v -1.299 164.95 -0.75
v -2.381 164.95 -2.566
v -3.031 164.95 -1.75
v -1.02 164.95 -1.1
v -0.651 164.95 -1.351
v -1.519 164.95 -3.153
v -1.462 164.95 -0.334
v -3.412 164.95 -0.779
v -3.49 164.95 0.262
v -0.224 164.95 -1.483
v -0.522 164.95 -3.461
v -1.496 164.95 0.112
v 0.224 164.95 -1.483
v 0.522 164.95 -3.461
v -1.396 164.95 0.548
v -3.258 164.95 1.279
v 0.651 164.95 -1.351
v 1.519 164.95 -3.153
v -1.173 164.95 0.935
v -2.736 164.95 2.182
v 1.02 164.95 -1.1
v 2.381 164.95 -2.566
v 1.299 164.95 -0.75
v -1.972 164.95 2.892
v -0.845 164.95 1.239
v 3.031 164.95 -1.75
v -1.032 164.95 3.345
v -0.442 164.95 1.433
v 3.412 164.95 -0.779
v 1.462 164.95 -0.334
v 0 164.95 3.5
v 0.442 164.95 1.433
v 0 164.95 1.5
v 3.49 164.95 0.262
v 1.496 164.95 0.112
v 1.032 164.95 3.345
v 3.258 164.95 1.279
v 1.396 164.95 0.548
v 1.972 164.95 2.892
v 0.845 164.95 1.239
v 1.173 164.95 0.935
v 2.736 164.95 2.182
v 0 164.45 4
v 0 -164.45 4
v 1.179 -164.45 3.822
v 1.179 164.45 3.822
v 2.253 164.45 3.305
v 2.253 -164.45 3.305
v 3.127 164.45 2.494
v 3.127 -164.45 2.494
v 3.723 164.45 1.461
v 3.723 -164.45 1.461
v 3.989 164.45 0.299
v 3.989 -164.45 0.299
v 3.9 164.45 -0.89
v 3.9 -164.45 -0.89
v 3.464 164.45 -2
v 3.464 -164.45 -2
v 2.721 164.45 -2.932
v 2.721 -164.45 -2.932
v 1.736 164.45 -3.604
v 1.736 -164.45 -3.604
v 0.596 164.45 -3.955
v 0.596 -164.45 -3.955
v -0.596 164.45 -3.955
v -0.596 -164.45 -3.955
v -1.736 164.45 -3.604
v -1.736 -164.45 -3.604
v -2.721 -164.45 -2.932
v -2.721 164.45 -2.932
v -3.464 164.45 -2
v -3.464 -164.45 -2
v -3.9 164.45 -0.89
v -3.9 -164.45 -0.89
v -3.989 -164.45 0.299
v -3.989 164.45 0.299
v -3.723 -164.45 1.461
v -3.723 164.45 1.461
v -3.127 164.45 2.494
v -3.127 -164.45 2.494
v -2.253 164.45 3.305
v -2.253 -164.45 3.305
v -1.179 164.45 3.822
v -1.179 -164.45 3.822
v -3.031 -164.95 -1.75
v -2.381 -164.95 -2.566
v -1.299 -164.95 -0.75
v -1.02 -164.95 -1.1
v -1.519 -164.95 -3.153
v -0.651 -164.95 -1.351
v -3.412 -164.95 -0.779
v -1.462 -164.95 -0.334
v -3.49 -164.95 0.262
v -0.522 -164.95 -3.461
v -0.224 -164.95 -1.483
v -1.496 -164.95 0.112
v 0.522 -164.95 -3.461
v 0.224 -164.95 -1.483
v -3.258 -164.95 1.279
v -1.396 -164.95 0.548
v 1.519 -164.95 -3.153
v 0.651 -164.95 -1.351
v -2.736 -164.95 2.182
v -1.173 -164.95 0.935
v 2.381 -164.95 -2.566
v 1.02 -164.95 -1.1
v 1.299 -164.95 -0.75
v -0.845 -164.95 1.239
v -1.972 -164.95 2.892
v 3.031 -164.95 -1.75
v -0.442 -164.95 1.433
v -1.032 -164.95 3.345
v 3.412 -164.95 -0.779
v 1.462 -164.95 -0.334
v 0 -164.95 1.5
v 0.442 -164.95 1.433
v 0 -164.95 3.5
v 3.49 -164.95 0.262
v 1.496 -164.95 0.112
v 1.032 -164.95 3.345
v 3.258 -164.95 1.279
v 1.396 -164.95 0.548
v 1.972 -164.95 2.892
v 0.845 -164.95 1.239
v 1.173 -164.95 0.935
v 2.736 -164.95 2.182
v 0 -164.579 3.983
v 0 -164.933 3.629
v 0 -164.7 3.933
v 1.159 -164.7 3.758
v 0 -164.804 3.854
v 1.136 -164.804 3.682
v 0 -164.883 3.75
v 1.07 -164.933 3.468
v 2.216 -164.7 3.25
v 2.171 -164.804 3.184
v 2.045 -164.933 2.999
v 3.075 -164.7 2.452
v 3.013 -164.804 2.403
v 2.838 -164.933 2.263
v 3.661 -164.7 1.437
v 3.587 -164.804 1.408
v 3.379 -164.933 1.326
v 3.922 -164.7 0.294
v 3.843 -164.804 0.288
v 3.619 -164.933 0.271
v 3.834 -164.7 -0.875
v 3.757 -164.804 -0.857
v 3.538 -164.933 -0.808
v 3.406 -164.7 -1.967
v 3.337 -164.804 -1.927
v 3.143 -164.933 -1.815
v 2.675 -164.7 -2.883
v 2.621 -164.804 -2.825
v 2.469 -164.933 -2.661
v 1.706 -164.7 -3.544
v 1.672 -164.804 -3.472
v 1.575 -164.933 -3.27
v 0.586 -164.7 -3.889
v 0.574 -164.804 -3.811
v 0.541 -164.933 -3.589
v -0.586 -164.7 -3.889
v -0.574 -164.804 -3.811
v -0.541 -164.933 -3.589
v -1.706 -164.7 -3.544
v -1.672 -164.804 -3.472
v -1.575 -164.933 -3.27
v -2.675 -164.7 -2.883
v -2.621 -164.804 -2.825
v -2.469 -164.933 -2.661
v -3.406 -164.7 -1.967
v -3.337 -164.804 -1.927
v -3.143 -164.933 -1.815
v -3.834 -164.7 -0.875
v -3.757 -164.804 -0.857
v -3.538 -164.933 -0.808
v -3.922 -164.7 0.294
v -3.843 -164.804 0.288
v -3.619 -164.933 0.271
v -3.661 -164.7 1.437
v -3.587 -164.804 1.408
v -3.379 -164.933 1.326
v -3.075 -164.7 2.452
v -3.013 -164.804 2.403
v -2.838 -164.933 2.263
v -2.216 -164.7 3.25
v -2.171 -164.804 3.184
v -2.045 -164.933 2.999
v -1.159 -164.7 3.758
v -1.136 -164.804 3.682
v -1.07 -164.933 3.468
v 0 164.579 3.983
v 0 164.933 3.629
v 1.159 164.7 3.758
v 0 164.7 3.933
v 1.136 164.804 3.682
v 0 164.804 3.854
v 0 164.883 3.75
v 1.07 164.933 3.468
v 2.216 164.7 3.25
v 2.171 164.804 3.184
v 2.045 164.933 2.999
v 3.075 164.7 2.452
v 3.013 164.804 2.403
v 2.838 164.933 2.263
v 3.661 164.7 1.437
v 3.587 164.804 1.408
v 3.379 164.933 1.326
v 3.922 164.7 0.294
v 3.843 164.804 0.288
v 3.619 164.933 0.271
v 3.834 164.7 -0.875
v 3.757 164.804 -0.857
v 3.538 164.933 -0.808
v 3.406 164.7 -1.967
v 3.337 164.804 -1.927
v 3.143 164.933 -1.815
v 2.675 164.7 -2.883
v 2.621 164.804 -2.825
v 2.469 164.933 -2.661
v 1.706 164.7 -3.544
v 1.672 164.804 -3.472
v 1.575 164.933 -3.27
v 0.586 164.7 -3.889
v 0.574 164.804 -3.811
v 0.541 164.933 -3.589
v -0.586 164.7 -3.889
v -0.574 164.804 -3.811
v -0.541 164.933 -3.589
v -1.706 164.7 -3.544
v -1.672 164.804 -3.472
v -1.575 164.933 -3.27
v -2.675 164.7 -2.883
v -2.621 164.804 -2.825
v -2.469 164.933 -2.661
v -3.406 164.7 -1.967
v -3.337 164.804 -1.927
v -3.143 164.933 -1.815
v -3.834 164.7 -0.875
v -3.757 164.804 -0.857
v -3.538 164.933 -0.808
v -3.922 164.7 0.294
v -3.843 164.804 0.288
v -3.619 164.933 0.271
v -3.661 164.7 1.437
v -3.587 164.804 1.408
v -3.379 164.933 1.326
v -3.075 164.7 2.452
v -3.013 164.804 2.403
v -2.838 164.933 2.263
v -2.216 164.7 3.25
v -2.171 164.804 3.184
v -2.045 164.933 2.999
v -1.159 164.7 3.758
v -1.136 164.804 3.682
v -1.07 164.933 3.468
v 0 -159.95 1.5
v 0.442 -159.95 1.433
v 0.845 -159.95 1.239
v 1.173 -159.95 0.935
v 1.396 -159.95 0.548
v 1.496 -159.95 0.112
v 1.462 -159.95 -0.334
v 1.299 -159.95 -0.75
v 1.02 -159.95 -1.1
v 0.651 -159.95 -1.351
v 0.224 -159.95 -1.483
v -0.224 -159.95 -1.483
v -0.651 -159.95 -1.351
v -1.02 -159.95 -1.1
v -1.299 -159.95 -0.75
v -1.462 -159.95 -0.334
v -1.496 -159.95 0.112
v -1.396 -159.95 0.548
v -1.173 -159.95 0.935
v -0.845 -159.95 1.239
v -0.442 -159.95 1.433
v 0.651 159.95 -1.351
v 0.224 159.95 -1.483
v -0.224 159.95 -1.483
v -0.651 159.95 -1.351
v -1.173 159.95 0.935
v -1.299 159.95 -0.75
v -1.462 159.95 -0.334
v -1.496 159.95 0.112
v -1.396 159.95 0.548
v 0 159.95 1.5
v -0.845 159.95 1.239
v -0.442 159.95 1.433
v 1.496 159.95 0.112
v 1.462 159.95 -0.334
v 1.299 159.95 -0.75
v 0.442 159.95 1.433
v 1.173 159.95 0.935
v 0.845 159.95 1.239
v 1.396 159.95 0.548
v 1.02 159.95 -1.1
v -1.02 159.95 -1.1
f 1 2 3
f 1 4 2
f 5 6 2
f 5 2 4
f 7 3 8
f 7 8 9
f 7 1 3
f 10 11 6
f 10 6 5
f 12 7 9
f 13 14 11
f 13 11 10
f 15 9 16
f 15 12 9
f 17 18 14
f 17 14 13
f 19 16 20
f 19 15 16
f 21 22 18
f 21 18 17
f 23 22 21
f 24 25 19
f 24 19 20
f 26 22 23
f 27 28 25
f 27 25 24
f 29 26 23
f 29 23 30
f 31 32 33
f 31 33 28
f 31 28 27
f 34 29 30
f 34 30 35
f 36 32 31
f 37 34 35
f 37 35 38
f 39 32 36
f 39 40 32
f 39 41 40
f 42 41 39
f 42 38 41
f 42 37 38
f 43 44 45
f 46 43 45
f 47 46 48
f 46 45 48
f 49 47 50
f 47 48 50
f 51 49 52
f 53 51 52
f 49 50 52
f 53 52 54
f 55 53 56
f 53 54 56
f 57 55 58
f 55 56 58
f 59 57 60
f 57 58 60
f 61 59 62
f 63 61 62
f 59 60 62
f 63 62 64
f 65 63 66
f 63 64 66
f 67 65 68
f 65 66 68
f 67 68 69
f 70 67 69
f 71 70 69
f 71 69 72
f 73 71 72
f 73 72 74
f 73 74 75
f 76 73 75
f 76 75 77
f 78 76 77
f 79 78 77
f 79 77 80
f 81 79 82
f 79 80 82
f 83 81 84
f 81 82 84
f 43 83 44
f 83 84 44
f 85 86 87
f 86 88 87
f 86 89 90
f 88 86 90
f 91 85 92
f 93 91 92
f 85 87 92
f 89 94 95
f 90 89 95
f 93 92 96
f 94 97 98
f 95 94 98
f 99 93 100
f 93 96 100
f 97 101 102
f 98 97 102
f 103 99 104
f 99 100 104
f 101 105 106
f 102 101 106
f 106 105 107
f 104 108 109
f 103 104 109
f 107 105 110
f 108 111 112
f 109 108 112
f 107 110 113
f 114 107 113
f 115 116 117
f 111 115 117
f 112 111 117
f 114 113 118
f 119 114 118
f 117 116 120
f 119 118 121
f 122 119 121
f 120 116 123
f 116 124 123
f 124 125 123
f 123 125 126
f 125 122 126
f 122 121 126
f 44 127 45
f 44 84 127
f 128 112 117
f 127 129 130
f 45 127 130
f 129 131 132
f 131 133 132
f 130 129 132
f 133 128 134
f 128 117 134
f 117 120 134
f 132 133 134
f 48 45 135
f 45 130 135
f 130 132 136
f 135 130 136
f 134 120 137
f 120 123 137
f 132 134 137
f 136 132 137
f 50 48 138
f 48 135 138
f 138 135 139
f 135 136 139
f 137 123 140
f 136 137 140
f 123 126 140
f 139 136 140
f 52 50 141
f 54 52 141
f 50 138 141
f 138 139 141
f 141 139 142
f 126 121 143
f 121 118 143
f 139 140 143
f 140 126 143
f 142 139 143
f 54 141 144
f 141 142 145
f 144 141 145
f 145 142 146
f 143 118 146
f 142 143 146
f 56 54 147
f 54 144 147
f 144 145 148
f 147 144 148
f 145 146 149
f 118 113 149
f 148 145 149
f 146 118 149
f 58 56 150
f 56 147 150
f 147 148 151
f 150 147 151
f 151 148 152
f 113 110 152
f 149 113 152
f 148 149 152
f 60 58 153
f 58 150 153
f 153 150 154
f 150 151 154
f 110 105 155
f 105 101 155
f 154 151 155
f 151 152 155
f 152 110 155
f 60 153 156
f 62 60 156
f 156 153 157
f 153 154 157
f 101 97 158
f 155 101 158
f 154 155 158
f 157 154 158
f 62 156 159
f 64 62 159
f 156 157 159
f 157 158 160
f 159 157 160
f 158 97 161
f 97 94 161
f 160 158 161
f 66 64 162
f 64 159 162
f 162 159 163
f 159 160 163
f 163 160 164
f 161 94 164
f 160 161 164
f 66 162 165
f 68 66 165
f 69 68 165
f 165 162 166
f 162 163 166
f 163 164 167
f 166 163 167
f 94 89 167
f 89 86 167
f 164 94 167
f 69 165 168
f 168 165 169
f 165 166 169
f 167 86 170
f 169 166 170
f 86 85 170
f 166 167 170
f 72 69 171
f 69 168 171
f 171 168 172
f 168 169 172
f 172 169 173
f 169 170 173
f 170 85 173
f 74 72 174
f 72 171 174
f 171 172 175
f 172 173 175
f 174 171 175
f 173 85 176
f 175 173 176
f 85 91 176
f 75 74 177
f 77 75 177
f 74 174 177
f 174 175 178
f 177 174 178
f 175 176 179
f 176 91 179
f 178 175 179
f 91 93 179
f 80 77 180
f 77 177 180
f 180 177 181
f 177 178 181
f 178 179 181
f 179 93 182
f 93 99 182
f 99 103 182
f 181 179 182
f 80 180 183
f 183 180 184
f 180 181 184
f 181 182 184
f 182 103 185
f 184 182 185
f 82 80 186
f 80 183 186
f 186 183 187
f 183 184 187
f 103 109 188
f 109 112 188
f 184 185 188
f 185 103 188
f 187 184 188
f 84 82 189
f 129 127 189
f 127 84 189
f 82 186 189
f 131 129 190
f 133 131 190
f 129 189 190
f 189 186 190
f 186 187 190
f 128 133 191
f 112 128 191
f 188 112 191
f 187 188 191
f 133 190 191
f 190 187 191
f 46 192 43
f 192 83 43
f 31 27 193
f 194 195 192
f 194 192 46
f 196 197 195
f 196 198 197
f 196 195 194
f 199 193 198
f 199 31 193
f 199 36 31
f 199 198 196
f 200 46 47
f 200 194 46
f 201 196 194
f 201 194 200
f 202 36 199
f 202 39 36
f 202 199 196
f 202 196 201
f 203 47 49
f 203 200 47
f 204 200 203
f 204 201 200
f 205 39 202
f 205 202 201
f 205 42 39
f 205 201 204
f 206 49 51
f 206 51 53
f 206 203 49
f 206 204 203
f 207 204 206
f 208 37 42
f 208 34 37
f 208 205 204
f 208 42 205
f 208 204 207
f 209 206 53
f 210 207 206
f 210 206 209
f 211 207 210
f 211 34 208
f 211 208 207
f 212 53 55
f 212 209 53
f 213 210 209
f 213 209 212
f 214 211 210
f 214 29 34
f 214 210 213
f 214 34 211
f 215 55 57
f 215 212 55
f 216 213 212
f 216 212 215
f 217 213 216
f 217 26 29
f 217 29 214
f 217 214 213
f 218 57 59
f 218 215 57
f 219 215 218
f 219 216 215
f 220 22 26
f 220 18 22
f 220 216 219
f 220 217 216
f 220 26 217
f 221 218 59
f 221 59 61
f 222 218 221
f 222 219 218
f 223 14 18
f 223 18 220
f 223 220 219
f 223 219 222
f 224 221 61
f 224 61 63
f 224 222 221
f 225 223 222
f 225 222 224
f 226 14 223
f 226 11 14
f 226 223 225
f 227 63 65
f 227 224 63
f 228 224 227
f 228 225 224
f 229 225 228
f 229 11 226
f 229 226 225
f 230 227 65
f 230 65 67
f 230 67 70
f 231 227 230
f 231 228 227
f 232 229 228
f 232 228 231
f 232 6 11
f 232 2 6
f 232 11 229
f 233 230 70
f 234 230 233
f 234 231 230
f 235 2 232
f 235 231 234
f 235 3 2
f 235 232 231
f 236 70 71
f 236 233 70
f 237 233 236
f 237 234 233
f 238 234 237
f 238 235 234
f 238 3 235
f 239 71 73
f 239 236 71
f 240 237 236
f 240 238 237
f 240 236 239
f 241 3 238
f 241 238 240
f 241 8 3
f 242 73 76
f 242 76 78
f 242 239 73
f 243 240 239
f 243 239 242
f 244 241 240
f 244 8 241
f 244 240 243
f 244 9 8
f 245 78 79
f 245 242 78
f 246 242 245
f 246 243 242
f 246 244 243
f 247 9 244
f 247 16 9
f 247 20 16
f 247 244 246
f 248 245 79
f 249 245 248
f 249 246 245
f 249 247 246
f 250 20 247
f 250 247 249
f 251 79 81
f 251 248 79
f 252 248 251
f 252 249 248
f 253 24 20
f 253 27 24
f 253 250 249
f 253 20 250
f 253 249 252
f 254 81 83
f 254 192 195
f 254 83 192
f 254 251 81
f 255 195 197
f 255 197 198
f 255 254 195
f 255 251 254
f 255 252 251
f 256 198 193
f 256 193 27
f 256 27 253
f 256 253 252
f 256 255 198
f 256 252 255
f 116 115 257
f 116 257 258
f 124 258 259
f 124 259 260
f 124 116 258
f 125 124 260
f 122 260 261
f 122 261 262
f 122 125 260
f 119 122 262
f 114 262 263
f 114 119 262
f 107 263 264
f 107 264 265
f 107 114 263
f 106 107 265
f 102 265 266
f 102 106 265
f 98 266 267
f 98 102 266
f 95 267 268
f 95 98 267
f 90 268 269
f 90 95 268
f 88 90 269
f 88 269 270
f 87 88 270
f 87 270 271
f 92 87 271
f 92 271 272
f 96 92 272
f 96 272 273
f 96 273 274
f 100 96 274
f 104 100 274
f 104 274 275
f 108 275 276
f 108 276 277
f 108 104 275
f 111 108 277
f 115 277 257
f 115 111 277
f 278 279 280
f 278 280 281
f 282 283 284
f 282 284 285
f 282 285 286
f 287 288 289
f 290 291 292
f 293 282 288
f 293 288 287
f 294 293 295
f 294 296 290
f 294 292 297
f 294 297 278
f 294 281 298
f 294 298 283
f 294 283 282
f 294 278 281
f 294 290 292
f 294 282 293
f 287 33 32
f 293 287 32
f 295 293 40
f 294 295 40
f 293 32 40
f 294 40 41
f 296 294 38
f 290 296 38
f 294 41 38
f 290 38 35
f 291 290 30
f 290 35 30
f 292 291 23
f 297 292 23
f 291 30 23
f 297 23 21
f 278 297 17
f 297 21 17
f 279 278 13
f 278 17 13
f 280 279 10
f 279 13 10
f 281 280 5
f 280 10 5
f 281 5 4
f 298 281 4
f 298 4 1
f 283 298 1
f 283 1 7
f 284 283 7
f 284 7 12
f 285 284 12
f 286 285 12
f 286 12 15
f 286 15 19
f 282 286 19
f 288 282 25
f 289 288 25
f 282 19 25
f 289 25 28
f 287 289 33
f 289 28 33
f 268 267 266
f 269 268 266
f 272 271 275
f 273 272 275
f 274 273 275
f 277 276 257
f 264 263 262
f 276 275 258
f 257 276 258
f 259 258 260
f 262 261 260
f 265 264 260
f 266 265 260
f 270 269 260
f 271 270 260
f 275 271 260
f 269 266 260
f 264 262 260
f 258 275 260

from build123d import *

# Parameters (mm, degrees)
EXTRUDE_1_DEPTH      = 164.95
EXTRUDE_1_DEPTH_BACK = 164.95
SKETCH_1_R           = 4
SKETCH_2_R           = 1.5
EXTRUDE_2_DEPTH      = 5
FILLET_1_R           = 0.5


with BuildPart() as part:
    # Эскиз1 → Выдавливание1 (new, two sides: drawn at the far end of the back side and taken through both)
    with BuildSketch(Plane(origin=(0, 0, 0), x_dir=(-1, 0, 0), z_dir=(0, 1, 0)).offset(-EXTRUDE_1_DEPTH_BACK)):
        with Locations(Location((0, 0, 0), (0, 0, 90))):
            Circle(SKETCH_1_R)
    extrude(amount=EXTRUDE_1_DEPTH + EXTRUDE_1_DEPTH_BACK)

    # Эскиз2 → Выдавливание2 (cut)
    with BuildSketch(Plane(origin=(0, 164.95, 0), x_dir=(-1, 0, 0), z_dir=(0, 1, 0))):
        with Locations(Location((0, 0, 0), (0, 0, 90))):
            Circle(SKETCH_2_R)
    extrude_2 = extrude(amount=-EXTRUDE_2_DEPTH, mode=Mode.SUBTRACT)

    # Зеркальное отражение1: Выдавливание2 across plane
    add(extrude_2.mirror(Plane.ZX), mode=Mode.SUBTRACT)

    # Сопряжение1
    fillet_1_edges = [part.edges().sort_by_distance(p)[0] for p in [
        (0, -164.95, -4),
        (0, 164.95, -4),
    ]]
    fillet(fillet_1_edges, radius=FILLET_1_R)


solid = part.part
